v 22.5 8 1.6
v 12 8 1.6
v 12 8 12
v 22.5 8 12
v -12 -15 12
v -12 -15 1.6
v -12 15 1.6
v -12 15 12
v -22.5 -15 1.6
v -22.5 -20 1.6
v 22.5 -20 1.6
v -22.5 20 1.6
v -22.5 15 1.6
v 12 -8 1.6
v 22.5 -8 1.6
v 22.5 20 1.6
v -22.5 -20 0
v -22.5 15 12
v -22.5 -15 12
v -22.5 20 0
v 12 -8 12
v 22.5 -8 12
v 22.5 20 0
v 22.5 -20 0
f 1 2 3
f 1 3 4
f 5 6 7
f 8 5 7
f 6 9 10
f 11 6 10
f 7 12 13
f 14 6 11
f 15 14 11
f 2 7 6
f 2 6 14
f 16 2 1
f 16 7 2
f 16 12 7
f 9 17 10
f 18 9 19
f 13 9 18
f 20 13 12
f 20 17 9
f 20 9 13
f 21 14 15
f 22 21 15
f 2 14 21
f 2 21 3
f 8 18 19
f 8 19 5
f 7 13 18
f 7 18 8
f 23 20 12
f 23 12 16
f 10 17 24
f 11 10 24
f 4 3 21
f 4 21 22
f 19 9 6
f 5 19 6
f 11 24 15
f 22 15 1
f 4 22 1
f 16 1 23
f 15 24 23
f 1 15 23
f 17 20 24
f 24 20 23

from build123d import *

# Parameters (mm, degrees)
SKETCH1_W             = 45
SKETCH1_H             = 40
PCB_DEPTH             = 1.6
SKETCH2_W             = 10.5
SKETCH2_H             = 30
MOTOR_TERMINALS_DEPTH = 10.4
SKETCH3_W             = 10.5
SKETCH3_H             = 16
POWER_TERMINAL_DEPTH  = 10.4


with BuildPart() as part:
    # Sketch1 → PCB (new body)
    with BuildSketch(Plane.XY):
        Rectangle(SKETCH1_W, SKETCH1_H)
    extrude(amount=PCB_DEPTH)

    # Sketch2 → Motor_terminals (add)
    with BuildSketch(Plane.XY.offset(1.6)):
        with Locations((-17.25, 0)):
            Rectangle(SKETCH2_W, SKETCH2_H)
    extrude(amount=MOTOR_TERMINALS_DEPTH)

    # Sketch3 → Power_terminal (add)
    with BuildSketch(Plane.XY.offset(1.6)):
        with Locations((17.25, 0)):
            Rectangle(SKETCH3_W, SKETCH3_H)
    extrude(amount=POWER_TERMINAL_DEPTH)


solid = part.part
